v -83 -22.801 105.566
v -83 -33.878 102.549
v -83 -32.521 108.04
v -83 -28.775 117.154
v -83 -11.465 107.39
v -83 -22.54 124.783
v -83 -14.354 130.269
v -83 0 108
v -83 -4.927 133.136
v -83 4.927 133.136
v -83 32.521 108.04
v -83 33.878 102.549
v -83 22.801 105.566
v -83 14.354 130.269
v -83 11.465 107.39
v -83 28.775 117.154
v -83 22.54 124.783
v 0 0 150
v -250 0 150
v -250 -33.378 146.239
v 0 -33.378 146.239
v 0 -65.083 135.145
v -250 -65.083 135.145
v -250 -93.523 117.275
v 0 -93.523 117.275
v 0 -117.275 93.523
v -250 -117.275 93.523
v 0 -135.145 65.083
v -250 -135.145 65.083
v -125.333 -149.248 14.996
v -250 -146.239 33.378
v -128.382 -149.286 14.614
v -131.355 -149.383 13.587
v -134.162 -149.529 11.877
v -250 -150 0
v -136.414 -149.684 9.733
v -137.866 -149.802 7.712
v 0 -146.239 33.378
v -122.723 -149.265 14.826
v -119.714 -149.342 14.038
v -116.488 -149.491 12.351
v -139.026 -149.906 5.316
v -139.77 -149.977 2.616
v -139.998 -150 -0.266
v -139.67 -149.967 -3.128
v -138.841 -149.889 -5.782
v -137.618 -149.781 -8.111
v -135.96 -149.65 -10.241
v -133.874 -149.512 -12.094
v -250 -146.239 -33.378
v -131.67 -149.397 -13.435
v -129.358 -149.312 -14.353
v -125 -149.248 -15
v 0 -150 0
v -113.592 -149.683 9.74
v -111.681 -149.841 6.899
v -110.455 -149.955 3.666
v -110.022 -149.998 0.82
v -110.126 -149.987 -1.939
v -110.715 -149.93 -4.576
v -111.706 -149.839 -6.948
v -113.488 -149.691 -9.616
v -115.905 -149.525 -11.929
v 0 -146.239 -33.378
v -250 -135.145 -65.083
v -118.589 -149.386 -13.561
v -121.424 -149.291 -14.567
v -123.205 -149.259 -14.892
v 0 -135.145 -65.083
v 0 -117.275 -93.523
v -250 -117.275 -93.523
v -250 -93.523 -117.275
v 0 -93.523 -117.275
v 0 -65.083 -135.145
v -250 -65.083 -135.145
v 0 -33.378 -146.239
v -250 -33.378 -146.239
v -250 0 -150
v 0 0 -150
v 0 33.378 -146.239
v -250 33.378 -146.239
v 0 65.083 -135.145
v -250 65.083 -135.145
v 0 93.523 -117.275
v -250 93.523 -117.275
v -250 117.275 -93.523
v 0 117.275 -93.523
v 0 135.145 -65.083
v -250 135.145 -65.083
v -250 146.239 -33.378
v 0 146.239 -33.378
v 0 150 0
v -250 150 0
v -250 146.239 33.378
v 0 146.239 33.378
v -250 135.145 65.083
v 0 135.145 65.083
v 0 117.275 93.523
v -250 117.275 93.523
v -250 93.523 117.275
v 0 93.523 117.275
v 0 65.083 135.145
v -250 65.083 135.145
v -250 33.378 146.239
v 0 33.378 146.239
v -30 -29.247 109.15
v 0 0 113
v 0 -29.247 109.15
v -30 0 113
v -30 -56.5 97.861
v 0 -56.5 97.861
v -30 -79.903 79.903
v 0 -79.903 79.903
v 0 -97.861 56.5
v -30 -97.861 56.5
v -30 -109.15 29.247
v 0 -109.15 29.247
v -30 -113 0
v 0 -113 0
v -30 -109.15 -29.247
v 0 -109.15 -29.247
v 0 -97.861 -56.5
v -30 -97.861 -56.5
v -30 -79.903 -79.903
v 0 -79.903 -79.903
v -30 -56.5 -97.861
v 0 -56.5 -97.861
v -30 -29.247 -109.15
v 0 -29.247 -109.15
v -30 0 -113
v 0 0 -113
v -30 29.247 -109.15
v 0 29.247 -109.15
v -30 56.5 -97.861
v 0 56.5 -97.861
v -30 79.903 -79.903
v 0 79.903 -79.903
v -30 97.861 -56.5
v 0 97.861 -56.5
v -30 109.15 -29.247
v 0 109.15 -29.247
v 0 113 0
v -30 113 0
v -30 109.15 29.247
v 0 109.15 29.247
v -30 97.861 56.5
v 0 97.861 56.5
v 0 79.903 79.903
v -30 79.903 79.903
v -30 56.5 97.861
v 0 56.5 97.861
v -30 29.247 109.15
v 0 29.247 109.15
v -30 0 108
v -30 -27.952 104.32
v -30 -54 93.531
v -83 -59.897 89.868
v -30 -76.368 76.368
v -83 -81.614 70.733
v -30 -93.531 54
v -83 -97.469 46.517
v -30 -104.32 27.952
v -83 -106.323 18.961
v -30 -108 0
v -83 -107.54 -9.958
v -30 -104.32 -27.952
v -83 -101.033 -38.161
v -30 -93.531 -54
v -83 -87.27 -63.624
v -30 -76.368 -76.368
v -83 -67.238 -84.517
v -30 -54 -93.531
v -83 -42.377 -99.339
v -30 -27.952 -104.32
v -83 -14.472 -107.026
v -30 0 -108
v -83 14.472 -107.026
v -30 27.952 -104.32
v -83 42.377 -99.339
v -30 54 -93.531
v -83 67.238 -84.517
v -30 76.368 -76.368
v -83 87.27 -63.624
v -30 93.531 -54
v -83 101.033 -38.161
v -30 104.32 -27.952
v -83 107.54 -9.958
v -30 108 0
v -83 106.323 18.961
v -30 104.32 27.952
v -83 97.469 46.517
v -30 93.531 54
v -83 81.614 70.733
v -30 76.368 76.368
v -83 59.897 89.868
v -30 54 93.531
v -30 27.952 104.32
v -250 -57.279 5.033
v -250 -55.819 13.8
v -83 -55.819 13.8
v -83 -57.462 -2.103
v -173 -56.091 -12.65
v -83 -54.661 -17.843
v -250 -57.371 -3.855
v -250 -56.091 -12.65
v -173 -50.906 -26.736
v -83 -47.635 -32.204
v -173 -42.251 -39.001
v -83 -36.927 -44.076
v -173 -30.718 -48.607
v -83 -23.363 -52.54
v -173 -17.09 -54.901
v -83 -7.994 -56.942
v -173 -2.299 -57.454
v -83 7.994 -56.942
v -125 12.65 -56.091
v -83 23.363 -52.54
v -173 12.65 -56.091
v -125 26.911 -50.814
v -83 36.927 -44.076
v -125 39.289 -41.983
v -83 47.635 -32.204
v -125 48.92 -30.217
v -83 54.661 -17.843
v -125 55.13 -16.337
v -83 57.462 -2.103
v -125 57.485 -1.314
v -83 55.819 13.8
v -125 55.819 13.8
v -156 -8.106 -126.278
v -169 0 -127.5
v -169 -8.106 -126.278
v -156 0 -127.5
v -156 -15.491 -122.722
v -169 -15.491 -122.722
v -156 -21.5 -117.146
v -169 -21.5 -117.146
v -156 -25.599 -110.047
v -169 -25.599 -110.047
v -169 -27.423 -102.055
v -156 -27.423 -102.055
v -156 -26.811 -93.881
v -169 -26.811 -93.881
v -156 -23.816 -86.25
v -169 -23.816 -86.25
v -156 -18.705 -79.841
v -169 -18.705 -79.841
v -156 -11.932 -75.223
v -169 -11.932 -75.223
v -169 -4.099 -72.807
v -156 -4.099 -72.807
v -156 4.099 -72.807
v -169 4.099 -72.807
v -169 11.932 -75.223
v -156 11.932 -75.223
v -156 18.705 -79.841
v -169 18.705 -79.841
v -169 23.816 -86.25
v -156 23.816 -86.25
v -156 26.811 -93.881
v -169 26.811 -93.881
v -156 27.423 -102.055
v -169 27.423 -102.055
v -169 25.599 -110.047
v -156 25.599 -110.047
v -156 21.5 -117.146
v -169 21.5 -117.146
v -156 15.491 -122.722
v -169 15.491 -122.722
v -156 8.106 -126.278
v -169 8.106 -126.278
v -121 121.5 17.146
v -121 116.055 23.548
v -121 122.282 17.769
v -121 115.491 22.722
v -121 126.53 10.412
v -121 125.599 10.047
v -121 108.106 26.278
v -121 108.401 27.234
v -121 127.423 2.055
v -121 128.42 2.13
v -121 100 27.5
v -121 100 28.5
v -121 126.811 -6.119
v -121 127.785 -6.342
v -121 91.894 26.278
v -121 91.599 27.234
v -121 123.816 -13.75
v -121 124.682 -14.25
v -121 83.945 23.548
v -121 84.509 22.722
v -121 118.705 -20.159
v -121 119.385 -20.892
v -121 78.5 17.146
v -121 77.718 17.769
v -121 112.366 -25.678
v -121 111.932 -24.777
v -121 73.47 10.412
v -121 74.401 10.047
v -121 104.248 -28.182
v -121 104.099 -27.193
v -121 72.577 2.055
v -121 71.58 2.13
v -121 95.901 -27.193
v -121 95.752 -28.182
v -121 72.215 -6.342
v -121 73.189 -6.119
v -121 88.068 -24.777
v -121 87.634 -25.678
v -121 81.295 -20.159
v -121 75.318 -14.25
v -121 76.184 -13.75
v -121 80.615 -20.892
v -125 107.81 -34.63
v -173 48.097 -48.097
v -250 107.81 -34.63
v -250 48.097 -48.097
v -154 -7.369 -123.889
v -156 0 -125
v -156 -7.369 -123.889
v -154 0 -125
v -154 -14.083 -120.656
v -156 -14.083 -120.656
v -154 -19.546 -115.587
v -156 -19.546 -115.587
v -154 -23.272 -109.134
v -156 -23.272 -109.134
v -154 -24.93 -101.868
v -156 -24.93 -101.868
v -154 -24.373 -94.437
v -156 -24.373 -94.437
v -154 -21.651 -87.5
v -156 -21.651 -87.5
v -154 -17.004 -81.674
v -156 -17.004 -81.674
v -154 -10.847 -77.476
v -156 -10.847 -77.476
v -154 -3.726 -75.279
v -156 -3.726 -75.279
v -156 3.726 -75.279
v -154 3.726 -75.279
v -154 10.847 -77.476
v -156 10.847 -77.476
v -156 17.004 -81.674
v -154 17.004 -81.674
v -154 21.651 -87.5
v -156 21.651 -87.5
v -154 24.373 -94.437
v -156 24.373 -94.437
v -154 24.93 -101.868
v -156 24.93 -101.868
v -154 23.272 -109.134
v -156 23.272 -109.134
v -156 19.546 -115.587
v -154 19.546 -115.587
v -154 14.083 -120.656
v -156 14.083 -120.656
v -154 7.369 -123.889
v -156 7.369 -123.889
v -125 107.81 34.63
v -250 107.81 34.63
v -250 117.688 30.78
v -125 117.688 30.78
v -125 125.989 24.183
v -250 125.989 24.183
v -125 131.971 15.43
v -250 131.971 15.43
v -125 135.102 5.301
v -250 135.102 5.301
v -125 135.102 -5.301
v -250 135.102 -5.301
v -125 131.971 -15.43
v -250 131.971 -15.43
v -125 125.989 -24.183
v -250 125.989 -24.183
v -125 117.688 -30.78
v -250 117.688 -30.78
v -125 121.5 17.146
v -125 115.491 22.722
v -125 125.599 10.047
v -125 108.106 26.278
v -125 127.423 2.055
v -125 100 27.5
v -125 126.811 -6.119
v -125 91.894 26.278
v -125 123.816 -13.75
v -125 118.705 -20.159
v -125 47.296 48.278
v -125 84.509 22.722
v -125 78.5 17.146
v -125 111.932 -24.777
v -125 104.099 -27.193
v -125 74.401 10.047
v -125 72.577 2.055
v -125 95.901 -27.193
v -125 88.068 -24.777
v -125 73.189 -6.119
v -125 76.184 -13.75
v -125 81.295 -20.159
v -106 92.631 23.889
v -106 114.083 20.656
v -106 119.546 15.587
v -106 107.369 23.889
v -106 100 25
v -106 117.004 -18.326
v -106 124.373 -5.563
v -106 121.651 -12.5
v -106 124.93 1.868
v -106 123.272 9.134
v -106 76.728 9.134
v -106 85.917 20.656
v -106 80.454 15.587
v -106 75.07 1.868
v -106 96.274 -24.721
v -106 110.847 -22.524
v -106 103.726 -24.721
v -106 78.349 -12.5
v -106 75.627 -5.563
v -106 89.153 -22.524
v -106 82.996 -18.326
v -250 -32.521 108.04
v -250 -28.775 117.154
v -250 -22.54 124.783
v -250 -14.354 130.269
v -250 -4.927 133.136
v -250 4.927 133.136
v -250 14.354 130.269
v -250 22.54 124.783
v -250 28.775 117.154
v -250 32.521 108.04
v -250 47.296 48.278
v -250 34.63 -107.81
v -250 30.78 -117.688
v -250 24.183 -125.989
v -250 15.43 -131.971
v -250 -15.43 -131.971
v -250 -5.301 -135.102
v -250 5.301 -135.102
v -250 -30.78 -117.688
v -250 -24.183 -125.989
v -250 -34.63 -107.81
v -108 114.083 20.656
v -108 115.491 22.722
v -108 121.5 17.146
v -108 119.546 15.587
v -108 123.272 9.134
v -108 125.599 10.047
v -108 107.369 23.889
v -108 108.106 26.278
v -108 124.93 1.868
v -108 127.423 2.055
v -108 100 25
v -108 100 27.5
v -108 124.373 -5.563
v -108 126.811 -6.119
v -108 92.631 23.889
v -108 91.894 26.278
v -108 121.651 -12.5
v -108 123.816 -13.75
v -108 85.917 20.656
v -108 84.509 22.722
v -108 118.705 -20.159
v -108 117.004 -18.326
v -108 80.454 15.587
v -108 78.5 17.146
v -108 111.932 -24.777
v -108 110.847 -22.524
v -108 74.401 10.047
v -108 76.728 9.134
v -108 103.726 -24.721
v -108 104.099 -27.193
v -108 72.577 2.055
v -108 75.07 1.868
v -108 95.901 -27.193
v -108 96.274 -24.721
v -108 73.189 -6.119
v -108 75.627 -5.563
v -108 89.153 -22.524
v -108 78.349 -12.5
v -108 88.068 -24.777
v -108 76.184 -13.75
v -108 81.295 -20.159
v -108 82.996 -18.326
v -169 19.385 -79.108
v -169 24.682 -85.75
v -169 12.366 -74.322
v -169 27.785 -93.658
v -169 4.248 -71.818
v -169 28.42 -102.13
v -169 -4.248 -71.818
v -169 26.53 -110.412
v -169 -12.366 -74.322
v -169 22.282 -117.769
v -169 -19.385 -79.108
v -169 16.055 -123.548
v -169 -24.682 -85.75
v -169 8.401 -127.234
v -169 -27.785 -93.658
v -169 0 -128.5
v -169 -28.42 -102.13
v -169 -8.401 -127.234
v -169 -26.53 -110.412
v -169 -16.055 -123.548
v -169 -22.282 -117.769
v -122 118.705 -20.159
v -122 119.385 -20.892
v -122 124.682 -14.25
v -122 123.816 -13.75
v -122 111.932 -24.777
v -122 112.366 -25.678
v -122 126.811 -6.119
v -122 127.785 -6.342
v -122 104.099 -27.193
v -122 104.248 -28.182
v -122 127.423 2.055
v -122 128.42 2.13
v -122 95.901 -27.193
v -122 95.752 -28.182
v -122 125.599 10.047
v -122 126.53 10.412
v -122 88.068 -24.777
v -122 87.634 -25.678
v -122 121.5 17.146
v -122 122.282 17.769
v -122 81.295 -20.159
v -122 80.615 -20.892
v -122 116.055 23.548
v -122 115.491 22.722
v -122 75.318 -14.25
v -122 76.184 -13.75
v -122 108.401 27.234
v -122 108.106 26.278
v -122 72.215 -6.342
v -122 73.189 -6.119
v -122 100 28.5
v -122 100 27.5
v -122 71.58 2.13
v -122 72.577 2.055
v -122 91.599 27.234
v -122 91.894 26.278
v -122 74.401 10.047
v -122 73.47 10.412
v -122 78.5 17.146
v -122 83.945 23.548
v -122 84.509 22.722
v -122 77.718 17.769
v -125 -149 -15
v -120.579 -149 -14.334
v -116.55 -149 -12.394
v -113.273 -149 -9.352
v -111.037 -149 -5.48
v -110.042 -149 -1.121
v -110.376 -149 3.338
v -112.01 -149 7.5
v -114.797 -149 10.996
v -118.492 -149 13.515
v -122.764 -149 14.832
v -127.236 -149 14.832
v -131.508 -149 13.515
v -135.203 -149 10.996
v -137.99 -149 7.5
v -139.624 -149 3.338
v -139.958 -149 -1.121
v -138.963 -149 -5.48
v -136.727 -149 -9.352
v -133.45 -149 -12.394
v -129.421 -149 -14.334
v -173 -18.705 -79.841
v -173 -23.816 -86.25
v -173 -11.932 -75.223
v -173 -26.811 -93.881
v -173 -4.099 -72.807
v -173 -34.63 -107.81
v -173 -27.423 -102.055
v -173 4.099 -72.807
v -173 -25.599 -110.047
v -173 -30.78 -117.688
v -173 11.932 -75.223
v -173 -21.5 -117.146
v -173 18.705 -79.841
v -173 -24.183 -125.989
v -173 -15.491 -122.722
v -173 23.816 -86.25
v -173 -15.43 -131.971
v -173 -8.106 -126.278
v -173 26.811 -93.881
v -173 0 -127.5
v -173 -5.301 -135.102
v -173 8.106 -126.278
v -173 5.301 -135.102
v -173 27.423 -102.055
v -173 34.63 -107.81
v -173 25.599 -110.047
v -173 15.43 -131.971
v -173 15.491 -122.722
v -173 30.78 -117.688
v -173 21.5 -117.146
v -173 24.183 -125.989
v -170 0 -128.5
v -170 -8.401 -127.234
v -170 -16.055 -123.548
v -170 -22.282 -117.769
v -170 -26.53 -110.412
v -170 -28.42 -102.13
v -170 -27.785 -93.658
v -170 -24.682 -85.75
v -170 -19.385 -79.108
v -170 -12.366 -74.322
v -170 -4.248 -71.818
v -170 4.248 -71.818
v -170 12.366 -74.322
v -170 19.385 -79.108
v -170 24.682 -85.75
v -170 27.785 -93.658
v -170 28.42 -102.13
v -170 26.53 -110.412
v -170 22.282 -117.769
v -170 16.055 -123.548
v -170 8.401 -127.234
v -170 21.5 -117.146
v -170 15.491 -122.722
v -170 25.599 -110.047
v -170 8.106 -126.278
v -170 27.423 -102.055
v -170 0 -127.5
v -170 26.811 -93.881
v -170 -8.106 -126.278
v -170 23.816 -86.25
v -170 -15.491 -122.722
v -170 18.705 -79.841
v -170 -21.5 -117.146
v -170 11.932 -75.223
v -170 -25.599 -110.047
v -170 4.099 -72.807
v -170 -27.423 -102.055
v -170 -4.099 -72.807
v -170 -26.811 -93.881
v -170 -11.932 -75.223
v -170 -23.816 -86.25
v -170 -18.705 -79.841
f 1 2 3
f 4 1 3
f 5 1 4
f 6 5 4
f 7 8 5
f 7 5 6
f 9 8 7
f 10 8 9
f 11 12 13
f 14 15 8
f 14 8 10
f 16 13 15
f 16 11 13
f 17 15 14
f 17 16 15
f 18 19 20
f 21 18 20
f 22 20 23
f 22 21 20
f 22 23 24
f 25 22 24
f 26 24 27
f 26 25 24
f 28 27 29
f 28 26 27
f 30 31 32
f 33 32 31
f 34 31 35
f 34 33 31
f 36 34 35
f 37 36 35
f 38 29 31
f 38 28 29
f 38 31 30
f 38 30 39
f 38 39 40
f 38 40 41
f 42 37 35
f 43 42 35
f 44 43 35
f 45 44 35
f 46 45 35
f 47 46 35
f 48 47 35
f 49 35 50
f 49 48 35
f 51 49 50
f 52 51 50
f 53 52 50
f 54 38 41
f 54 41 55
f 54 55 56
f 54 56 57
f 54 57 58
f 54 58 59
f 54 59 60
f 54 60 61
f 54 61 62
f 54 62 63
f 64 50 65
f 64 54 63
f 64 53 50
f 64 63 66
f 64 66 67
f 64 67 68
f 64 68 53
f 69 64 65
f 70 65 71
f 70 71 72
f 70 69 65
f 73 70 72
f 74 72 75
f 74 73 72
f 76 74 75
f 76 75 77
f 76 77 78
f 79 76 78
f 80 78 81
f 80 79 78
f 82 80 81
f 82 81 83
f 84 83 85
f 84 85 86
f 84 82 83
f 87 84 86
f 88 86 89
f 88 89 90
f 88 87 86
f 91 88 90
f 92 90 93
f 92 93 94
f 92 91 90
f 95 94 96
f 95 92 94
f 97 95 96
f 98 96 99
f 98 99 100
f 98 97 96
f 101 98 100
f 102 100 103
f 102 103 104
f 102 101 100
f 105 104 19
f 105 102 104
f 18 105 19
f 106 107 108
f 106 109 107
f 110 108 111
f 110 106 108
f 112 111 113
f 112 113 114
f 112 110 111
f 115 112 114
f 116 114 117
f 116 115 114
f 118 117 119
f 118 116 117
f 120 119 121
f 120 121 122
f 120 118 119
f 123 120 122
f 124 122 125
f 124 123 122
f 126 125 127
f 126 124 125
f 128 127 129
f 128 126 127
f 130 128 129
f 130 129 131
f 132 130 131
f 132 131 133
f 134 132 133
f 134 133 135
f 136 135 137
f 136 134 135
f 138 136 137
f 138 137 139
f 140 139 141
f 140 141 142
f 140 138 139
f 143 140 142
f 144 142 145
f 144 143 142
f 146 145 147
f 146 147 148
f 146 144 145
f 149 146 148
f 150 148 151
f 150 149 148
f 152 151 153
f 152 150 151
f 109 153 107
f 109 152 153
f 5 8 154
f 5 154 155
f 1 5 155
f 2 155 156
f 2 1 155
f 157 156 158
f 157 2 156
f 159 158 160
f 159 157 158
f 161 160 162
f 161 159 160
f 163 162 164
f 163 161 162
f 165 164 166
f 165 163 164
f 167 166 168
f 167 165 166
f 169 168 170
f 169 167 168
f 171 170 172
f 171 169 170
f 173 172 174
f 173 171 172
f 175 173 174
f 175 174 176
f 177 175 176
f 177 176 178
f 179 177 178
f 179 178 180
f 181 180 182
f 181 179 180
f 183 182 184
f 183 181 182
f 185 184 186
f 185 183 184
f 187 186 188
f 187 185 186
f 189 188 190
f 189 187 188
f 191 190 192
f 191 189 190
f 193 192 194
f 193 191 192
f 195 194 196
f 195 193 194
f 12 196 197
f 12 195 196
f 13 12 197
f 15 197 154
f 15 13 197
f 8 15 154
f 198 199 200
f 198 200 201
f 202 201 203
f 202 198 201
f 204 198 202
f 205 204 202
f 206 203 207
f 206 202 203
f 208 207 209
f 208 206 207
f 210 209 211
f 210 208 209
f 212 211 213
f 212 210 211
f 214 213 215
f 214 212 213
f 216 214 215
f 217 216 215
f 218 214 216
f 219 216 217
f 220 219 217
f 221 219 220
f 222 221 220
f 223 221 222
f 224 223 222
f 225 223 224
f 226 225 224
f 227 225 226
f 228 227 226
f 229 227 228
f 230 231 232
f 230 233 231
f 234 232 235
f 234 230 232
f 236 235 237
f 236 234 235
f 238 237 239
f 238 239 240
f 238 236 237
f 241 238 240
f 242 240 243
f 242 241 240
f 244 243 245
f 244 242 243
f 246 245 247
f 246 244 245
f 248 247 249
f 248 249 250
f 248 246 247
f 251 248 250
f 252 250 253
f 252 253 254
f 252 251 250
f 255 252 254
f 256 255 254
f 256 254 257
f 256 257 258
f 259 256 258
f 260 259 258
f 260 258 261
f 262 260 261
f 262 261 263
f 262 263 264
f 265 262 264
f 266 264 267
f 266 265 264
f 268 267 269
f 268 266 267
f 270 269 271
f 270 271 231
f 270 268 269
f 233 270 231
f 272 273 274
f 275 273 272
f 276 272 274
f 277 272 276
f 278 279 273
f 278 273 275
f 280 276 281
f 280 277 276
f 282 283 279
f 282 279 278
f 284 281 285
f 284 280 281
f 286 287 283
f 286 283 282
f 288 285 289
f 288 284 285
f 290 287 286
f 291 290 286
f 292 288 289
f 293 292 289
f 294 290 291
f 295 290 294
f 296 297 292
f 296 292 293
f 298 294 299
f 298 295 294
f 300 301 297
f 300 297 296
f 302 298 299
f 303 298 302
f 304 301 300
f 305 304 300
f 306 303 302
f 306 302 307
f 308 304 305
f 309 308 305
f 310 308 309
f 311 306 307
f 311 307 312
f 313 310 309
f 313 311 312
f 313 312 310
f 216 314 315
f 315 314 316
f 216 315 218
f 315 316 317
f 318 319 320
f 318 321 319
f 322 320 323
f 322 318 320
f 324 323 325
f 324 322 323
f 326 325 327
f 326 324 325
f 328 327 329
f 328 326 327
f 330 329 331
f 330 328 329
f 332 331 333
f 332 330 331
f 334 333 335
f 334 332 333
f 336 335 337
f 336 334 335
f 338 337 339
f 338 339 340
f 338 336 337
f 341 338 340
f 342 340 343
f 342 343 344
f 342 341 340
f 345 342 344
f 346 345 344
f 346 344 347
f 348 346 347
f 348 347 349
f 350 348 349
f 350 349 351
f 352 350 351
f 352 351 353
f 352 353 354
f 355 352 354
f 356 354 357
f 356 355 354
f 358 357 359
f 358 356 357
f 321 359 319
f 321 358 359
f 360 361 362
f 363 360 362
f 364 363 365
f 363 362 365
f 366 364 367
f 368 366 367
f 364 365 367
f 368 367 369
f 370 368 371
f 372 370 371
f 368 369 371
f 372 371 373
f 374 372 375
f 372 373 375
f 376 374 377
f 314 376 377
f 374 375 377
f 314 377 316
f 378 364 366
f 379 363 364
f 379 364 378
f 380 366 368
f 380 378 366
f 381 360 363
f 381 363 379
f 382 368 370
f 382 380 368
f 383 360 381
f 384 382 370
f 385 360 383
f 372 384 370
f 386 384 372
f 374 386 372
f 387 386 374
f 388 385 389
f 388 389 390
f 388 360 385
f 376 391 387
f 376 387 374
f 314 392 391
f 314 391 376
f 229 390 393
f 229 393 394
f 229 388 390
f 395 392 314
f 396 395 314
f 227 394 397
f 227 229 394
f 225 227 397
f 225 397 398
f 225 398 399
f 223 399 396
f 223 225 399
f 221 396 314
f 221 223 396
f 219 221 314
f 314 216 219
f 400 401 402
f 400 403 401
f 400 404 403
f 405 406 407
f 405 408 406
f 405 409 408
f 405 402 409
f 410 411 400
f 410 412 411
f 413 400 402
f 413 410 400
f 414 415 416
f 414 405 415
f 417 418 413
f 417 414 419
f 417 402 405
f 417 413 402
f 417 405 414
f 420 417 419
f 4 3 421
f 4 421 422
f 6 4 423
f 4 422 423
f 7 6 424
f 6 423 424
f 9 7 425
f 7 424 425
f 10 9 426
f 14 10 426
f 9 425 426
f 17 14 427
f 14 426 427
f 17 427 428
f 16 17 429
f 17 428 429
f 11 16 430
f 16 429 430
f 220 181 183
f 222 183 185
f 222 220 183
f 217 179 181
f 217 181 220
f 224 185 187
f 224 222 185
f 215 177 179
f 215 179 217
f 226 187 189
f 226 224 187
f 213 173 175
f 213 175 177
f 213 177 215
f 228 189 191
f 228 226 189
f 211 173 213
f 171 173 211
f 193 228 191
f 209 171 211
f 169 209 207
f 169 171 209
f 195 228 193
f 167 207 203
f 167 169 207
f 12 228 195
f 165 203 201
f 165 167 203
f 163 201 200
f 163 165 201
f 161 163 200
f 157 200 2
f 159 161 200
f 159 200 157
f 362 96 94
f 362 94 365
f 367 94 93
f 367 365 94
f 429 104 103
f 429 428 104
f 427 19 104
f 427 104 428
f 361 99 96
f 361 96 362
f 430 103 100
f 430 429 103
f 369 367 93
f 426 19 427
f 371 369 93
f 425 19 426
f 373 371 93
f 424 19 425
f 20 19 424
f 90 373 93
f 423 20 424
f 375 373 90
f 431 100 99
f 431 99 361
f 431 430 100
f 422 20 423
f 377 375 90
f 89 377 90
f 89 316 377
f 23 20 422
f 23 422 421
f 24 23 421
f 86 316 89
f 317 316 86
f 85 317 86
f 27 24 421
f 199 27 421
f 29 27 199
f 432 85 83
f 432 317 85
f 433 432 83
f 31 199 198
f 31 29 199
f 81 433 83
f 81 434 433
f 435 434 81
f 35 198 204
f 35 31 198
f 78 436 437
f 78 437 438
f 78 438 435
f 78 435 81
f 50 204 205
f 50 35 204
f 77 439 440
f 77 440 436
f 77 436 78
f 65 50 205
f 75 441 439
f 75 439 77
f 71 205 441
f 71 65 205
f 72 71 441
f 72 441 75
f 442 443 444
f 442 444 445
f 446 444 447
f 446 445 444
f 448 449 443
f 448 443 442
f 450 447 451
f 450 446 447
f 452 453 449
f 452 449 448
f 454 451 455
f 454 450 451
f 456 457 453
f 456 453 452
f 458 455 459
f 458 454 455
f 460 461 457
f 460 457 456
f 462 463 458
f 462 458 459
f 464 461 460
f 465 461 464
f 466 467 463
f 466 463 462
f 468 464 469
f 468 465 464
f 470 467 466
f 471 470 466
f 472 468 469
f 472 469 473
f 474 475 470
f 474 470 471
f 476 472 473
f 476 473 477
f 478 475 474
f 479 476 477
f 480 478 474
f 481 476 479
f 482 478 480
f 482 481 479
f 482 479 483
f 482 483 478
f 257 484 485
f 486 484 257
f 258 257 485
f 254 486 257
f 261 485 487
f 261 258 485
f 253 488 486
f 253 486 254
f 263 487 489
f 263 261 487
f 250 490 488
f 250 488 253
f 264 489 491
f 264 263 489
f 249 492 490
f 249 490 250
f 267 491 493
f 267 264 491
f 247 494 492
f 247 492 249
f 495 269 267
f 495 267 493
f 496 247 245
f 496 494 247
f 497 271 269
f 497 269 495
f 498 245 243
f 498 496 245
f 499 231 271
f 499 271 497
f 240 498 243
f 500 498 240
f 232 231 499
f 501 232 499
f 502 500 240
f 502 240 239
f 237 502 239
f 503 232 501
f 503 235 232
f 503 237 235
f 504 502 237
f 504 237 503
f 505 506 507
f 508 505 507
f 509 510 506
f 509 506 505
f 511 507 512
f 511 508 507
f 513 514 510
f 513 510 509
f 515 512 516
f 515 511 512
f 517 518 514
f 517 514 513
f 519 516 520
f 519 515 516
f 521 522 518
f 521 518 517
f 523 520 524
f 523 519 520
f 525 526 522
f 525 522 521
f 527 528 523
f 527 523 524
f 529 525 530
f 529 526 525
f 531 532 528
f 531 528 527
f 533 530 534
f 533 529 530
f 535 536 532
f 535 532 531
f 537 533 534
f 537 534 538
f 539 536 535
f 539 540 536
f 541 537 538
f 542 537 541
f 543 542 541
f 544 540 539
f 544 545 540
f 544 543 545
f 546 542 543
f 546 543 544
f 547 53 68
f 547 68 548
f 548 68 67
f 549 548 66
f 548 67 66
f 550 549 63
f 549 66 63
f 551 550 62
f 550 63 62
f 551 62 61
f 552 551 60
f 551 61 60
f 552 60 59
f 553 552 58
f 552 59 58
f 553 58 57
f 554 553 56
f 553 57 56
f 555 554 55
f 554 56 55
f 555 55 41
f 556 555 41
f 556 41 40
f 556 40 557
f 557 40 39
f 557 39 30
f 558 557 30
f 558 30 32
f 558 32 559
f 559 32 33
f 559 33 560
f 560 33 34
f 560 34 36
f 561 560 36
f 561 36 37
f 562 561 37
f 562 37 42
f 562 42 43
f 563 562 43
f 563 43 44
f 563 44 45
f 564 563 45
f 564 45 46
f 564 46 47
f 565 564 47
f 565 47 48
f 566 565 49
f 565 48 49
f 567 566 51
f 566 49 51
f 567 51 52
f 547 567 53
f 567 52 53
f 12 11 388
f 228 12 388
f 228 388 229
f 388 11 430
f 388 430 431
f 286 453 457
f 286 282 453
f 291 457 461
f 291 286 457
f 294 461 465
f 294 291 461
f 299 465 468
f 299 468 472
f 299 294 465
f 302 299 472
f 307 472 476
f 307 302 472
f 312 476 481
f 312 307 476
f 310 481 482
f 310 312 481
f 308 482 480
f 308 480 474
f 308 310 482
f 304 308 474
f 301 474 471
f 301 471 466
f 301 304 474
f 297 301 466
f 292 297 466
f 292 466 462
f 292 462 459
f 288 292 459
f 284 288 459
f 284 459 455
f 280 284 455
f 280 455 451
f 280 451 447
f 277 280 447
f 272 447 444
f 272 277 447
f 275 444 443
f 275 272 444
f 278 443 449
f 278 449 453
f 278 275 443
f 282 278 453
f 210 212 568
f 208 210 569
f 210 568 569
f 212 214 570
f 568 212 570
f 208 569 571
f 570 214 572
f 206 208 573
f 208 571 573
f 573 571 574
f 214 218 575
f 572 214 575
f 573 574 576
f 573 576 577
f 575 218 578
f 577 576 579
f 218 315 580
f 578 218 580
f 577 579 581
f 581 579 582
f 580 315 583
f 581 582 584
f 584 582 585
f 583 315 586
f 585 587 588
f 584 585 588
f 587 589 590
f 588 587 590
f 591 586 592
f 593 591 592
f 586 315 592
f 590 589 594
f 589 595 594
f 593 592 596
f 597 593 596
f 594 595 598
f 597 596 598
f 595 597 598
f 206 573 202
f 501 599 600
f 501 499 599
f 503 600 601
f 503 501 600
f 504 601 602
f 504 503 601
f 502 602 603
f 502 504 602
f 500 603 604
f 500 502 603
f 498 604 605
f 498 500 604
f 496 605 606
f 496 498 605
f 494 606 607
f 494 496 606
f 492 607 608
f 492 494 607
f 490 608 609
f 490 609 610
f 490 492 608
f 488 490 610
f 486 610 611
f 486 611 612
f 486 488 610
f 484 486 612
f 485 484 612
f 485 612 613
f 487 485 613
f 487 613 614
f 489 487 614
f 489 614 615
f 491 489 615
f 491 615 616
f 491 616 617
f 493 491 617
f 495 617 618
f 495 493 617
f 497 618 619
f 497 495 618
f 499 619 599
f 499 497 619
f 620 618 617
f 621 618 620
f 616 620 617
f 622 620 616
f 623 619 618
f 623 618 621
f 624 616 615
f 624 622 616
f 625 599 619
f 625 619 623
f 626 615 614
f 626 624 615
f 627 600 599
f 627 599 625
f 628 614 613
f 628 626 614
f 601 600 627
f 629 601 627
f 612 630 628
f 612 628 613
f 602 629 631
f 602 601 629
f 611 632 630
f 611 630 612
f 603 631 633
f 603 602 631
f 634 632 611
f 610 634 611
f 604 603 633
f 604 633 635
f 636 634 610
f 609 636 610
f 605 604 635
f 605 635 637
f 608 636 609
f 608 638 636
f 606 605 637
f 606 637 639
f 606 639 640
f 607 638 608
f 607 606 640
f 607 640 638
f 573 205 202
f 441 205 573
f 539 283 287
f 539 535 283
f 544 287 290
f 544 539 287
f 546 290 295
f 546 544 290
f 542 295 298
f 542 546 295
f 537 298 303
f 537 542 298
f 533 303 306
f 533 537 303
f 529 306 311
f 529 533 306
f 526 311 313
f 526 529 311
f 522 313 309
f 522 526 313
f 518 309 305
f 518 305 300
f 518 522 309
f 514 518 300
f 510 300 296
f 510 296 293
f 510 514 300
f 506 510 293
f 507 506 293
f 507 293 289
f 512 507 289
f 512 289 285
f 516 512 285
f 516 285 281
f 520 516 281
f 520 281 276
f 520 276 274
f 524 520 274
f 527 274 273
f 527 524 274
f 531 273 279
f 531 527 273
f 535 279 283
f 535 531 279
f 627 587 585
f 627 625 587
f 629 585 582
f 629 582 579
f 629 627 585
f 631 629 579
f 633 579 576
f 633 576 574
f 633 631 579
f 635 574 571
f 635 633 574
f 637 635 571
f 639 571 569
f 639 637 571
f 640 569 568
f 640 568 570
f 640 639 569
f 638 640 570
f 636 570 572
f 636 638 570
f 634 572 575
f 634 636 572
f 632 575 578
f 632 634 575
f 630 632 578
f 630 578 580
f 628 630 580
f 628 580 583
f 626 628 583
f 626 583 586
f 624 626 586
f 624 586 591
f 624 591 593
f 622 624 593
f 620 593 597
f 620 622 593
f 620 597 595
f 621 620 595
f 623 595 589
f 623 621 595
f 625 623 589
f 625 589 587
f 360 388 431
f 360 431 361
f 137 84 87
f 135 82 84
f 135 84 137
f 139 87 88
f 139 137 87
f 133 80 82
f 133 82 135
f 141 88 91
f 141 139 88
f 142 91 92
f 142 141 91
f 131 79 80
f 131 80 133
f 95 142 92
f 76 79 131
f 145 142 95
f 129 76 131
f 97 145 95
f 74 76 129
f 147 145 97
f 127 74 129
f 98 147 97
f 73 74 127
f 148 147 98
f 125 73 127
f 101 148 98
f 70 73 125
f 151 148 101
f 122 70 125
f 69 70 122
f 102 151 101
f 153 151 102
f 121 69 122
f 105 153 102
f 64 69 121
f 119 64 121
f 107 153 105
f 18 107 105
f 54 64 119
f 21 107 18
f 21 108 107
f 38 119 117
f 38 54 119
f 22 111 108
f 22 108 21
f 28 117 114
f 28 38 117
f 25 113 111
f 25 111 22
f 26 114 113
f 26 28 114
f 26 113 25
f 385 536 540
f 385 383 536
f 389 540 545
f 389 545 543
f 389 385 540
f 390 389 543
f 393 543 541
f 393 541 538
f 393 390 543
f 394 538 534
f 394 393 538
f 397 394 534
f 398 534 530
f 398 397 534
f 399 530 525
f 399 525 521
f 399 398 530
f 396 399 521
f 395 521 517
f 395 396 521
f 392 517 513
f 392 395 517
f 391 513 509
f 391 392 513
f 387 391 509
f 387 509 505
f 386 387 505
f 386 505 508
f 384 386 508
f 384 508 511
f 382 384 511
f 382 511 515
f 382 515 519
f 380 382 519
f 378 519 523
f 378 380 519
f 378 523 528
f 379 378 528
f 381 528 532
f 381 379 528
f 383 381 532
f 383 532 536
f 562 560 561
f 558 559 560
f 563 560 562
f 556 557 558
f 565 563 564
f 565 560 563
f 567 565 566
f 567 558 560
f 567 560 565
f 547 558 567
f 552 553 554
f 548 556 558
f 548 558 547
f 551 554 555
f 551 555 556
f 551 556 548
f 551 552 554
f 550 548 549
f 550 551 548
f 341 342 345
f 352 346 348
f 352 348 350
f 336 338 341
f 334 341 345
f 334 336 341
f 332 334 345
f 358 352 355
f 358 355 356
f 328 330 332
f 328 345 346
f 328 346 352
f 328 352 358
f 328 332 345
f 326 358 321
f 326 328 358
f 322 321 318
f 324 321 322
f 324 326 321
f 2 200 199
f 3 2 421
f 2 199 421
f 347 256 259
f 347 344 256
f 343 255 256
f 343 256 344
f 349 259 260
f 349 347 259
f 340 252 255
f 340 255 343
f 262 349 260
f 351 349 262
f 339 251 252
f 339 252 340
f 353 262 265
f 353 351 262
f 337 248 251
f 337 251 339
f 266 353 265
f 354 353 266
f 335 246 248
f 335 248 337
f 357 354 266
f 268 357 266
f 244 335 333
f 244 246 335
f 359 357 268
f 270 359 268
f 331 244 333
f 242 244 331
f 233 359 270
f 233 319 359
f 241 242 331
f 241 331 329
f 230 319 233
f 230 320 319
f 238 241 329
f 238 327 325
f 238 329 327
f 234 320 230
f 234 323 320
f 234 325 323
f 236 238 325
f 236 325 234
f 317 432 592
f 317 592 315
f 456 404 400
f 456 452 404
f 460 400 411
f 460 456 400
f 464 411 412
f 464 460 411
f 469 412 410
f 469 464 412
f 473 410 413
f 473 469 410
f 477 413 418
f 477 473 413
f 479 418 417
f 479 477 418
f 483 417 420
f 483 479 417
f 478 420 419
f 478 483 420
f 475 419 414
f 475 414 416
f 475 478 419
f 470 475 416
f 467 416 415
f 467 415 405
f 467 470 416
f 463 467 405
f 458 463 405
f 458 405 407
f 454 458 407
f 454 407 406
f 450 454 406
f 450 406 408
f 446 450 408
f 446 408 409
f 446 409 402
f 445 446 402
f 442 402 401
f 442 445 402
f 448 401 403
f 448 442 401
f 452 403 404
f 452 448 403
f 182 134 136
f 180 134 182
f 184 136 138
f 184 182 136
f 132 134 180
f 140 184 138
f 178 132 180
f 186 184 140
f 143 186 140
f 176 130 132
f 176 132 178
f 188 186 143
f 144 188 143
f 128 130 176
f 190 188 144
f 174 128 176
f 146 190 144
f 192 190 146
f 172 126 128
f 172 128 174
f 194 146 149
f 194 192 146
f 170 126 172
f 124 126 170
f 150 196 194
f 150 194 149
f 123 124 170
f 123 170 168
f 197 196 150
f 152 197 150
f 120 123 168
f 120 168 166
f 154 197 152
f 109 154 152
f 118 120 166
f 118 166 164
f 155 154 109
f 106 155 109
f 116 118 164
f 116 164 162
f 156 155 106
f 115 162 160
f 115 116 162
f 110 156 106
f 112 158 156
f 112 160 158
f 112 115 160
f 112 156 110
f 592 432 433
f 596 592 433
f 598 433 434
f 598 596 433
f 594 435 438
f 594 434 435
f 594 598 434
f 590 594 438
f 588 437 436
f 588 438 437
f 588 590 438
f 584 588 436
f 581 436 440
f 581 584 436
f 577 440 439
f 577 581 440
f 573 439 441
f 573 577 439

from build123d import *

# Parameters (mm, degrees)
EXTRUDE1_DEPTH = 167
EXTRUDE2_DEPTH = 125
EXTRUDE3_DEPTH = 77
SKETCH10_R     = 15
EXTRUDE4_DEPTH = 1


with BuildPart() as part:
    # Sketch1 → Revolve1 (revolve)
    with BuildSketch(Plane.XY, mode=Mode.PRIVATE) as revolve1_sk:
        Polygon((0, 113), (-30, 113), (-30, 108), (-83, 108), (-83, 57.5), (-250, 57.5), (-250, 150), (0, 150), align=None)
    revolve(revolve1_sk.sketch.rotate(Axis((0, 0, 0), (1, 0, 0)), 90), axis=Axis((0, 0, 0), (1, 0, 0)))

    # Sketch2 → Extrude1 (cut)
    with BuildSketch(Plane.ZY.offset(250)):
        with BuildLine():
            Line((13.8, -55.819441058), (108.04, -32.520891747))
            ThreePointArc((108.04, -32.520891747), (133.5, 0), (108.04, 32.520891747))
            Line((108.04, 32.520891747), (13.8, 55.819441058))
            ThreePointArc((13.8, 55.819441058), (57.5, 0), (13.8, -55.819441058))
        make_face()
    extrude(amount=-EXTRUDE1_DEPTH, mode=Mode.SUBTRACT)

    # Sketch5 → Cut-Revolve1 (revolve, cut)
    with BuildSketch(Plane.XY, mode=Mode.PRIVATE) as cut_revolve1_sk:
        Polygon((-125, 135.5), (-262.537169633, 135.5), (-262.537169633, 100), (-106, 100), (-106, 125), (-108, 125), (-108, 127.5), (-121, 127.5), (-121, 128.5), (-122, 128.5), (-122, 127.5), (-125, 127.5), align=None)
    revolve(cut_revolve1_sk.sketch.rotate(Axis((-262.537169633, 100, 0), (1, 0, 0)), 90), axis=Axis((-262.537169633, 100, 0), (1, 0, 0)), mode=Mode.SUBTRACT)

    # Sketch6 → Extrude2 (cut)
    with BuildSketch(Plane.ZY.offset(250)):
        with BuildLine():
            Line((-34.630245451, 107.81), (-56.091242632, 12.65))
            ThreePointArc((-56.091242632, 12.65), (0, -57.5), (56.091242632, 12.65))
            Line((56.091242632, 12.65), (34.630245451, 107.81))
            ThreePointArc((34.630245451, 107.81), (0, 135.5), (-34.630245451, 107.81))
        make_face()
    extrude(amount=-EXTRUDE2_DEPTH, mode=Mode.SUBTRACT)

    # Sketch7 → Cut-Revolve2 (revolve, cut)
    with BuildSketch(Plane(origin=(0, 0, 0), x_dir=(1, 0, 0), z_dir=(0, 1, 0))):
        Polygon((-250, 135.5), (-173, 135.5), (-173, 127.5), (-170, 127.5), (-170, 128.5), (-169, 128.5), (-169, 127.5), (-156, 127.5), (-156, 125), (-154, 125), (-154, 100), (-250, 100), align=None)
    revolve(axis=Axis((-154, 0, -100), (-1, 0, 0)), mode=Mode.SUBTRACT)

    # Sketch8 → Extrude3 (cut)
    with BuildSketch(Plane.ZY.offset(250)):
        with BuildLine():
            Line((-107.81, 34.630245451), (-12.65, 56.091242632))
            ThreePointArc((-12.65, 56.091242632), (57.5, 0), (-12.65, -56.091242632))
            Line((-12.65, -56.091242632), (-107.81, -34.630245451))
            ThreePointArc((-107.81, -34.630245451), (-135.5, 0), (-107.81, 34.630245451))
        make_face()
    extrude(amount=-EXTRUDE3_DEPTH, mode=Mode.SUBTRACT)

    # Sketch10 → Extrude4 (cut)
    with BuildSketch(Plane(origin=(0, -150, 0), x_dir=(-1, 0, 0), z_dir=(0, -1, 0))):
        with Locations(Location((125, 0, 0), (0, 0, 90))):
            Circle(SKETCH10_R)
    extrude(amount=-EXTRUDE4_DEPTH, mode=Mode.SUBTRACT)


solid = part.part
